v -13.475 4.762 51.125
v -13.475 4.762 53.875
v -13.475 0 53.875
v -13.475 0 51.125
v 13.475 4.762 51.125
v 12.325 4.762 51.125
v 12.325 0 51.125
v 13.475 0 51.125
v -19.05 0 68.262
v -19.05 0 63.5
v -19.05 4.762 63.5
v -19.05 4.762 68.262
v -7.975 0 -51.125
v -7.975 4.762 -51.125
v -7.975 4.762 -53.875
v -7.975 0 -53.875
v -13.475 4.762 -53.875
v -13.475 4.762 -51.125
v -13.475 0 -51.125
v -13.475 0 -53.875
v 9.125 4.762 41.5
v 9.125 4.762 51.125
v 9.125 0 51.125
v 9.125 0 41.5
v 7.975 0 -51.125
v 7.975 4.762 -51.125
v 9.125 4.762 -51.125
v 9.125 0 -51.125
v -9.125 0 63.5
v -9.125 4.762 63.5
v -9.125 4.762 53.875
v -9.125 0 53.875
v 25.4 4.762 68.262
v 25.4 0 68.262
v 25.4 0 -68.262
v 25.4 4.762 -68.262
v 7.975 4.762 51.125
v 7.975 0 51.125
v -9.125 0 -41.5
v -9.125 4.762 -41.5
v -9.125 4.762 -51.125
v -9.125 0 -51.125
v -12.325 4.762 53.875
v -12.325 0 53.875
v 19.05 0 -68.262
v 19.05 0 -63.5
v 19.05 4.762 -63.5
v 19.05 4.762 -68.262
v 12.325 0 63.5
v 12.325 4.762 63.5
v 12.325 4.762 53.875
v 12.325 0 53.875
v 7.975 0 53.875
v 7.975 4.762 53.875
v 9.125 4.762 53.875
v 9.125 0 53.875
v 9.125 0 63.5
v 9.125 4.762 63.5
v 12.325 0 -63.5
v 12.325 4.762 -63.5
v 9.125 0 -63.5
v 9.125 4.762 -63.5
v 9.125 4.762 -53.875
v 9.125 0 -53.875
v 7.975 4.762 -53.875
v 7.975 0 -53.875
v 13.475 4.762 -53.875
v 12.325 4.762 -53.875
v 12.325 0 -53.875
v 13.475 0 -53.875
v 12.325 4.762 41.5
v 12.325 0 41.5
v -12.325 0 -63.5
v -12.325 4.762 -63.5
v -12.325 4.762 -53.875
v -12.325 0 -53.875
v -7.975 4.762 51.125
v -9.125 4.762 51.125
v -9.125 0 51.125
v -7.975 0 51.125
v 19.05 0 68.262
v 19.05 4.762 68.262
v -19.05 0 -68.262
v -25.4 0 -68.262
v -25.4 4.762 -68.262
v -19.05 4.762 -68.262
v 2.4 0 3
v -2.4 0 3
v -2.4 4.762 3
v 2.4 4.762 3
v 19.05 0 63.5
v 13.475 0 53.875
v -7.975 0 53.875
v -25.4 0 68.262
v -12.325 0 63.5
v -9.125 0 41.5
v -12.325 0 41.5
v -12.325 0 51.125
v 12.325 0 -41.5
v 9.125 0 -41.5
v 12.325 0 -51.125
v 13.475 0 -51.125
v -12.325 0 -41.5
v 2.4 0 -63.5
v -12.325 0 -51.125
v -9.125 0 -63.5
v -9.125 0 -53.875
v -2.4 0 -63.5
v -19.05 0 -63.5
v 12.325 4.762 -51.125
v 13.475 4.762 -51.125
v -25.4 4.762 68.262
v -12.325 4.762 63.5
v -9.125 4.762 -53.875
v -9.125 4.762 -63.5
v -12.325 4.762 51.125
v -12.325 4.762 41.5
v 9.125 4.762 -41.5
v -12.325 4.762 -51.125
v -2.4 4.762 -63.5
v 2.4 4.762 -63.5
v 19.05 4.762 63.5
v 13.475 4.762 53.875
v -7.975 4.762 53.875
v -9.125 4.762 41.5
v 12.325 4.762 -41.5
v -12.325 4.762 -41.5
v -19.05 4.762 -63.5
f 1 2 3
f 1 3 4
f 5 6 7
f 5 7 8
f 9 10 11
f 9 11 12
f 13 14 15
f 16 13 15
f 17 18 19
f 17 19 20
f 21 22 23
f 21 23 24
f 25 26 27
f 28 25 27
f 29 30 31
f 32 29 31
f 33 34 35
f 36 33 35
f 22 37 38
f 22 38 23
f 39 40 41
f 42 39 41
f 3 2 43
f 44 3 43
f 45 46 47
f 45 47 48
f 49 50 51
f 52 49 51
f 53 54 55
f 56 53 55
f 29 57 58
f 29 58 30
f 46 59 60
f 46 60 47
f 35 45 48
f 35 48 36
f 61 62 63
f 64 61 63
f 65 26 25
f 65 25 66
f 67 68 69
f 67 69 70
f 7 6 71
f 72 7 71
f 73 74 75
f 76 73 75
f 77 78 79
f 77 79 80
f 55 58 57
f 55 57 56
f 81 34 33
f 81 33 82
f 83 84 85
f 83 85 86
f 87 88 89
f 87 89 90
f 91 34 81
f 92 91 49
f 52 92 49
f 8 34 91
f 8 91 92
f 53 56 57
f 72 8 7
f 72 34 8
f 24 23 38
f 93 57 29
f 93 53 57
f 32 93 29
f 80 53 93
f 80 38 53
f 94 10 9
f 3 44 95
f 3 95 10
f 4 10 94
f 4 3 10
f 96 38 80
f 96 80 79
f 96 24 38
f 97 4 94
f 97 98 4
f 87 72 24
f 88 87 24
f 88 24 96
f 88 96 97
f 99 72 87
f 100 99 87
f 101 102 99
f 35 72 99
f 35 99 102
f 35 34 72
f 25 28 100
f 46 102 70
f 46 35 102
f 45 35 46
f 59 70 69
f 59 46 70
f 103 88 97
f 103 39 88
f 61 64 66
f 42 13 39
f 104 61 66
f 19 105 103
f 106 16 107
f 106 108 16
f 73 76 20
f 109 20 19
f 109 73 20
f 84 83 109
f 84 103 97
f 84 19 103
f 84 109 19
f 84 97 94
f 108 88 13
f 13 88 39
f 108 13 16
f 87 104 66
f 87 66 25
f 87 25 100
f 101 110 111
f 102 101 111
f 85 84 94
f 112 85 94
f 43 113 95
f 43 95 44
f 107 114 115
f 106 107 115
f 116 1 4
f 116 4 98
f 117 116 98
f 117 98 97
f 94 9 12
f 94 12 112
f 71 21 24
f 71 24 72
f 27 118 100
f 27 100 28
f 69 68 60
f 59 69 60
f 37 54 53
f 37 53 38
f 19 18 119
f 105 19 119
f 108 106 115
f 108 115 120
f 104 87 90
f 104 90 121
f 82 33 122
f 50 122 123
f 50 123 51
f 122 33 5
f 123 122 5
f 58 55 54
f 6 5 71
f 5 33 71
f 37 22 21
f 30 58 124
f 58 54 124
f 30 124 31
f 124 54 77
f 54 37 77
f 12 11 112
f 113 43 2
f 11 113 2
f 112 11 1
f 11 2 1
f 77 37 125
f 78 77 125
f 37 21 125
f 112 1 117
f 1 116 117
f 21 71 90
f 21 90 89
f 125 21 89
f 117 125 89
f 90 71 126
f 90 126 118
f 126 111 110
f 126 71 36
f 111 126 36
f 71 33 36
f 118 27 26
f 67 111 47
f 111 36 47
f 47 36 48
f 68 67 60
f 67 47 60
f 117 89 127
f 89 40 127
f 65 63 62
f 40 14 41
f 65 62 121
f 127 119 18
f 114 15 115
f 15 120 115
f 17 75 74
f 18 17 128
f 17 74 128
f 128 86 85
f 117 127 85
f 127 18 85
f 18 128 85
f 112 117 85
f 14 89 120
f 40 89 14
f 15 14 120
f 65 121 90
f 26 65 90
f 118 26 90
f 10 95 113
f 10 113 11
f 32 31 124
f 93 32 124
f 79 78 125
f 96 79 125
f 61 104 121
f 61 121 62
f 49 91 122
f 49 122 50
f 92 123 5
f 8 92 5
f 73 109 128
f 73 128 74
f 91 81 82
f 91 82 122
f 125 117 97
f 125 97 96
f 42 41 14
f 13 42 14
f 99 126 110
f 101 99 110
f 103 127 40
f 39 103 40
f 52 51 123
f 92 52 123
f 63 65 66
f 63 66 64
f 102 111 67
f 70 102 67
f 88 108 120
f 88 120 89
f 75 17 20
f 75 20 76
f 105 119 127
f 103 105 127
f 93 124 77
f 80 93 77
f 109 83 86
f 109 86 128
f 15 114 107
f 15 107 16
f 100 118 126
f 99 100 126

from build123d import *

# Parameters (mm, degrees)
BOSS_EXTRUDE1_DEPTH = 4.7625
SKETCH2_W           = 3.2
SKETCH2_H           = 9.625
SKETCH2_H_2         = 2.75
SKETCH2_W_2         = 1.15
CUT_EXTRUDE1_DEPTH  = 4.7625


with BuildPart() as part:
    # Sketch1 → Boss-Extrude1 (new body)
    with BuildSketch(Plane(origin=(0, 0, 0), x_dir=(1, 0, 0), z_dir=(0, 1, 0))):
        Polygon((-25.4, -63.5), (-25.4, 63.5), (-25.4, 68.2625), (-19.05, 68.2625), (-19.05, 63.5), (-2.4, 63.5), (-2.4, -3), (2.4, -3), (2.4, 63.5), (19.05, 63.5), (19.05, 68.2625), (25.4, 68.2625), (25.4, 63.5), (25.4, -63.5), (25.4, -68.2625), (19.05, -68.2625), (19.05, -63.5), (-19.05, -63.5), (-19.05, -68.2625), (-25.4, -68.2625), align=None)
    extrude(amount=BOSS_EXTRUDE1_DEPTH)

    # Sketch2 → Cut-Extrude1 (cut)
    with BuildSketch(Plane(origin=(0, 4.7625, 0), x_dir=(1, 0, 0), z_dir=(0, 1, 0))):
        with Locations((-10.725, 58.6875)):
            Rectangle(SKETCH2_W, SKETCH2_H)
        with Locations((-10.725, 52.5)):
            Rectangle(SKETCH2_W, SKETCH2_H_2)
        with Locations((-8.55, 52.5)):
            Rectangle(SKETCH2_W_2, SKETCH2_H_2)
        with Locations((-10.725, 46.3125)):
            Rectangle(SKETCH2_W, SKETCH2_H)
        with Locations((-12.9, 52.5)):
            Rectangle(SKETCH2_W_2, SKETCH2_H_2)
        with Locations((10.725, 58.6875)):
            Rectangle(SKETCH2_W, SKETCH2_H)
        with Locations((10.725, 52.5)):
            Rectangle(SKETCH2_W, SKETCH2_H_2)
        with Locations((8.55, 52.5)):
            Rectangle(SKETCH2_W_2, SKETCH2_H_2)
        with Locations((12.9, 52.5)):
            Rectangle(SKETCH2_W_2, SKETCH2_H_2)
        with Locations((10.725, 46.3125)):
            Rectangle(SKETCH2_W, SKETCH2_H)
        with Locations((-10.725, -46.3125)):
            Rectangle(SKETCH2_W, SKETCH2_H)
        with Locations((-10.725, -58.6875)):
            Rectangle(SKETCH2_W, SKETCH2_H)
        with Locations((-12.9, -52.5)):
            Rectangle(SKETCH2_W_2, SKETCH2_H_2)
        with Locations((-10.725, -52.5)):
            Rectangle(SKETCH2_W, SKETCH2_H_2)
        with Locations((-8.55, -52.5)):
            Rectangle(SKETCH2_W_2, SKETCH2_H_2)
        with Locations((10.725, -46.3125)):
            Rectangle(SKETCH2_W, SKETCH2_H)
        with Locations((8.55, -52.5)):
            Rectangle(SKETCH2_W_2, SKETCH2_H_2)
        with Locations((10.725, -52.5)):
            Rectangle(SKETCH2_W, SKETCH2_H_2)
        with Locations((12.9, -52.5)):
            Rectangle(SKETCH2_W_2, SKETCH2_H_2)
        with Locations((10.725, -58.6875)):
            Rectangle(SKETCH2_W, SKETCH2_H)
    extrude(amount=-CUT_EXTRUDE1_DEPTH, mode=Mode.SUBTRACT)


solid = part.part
